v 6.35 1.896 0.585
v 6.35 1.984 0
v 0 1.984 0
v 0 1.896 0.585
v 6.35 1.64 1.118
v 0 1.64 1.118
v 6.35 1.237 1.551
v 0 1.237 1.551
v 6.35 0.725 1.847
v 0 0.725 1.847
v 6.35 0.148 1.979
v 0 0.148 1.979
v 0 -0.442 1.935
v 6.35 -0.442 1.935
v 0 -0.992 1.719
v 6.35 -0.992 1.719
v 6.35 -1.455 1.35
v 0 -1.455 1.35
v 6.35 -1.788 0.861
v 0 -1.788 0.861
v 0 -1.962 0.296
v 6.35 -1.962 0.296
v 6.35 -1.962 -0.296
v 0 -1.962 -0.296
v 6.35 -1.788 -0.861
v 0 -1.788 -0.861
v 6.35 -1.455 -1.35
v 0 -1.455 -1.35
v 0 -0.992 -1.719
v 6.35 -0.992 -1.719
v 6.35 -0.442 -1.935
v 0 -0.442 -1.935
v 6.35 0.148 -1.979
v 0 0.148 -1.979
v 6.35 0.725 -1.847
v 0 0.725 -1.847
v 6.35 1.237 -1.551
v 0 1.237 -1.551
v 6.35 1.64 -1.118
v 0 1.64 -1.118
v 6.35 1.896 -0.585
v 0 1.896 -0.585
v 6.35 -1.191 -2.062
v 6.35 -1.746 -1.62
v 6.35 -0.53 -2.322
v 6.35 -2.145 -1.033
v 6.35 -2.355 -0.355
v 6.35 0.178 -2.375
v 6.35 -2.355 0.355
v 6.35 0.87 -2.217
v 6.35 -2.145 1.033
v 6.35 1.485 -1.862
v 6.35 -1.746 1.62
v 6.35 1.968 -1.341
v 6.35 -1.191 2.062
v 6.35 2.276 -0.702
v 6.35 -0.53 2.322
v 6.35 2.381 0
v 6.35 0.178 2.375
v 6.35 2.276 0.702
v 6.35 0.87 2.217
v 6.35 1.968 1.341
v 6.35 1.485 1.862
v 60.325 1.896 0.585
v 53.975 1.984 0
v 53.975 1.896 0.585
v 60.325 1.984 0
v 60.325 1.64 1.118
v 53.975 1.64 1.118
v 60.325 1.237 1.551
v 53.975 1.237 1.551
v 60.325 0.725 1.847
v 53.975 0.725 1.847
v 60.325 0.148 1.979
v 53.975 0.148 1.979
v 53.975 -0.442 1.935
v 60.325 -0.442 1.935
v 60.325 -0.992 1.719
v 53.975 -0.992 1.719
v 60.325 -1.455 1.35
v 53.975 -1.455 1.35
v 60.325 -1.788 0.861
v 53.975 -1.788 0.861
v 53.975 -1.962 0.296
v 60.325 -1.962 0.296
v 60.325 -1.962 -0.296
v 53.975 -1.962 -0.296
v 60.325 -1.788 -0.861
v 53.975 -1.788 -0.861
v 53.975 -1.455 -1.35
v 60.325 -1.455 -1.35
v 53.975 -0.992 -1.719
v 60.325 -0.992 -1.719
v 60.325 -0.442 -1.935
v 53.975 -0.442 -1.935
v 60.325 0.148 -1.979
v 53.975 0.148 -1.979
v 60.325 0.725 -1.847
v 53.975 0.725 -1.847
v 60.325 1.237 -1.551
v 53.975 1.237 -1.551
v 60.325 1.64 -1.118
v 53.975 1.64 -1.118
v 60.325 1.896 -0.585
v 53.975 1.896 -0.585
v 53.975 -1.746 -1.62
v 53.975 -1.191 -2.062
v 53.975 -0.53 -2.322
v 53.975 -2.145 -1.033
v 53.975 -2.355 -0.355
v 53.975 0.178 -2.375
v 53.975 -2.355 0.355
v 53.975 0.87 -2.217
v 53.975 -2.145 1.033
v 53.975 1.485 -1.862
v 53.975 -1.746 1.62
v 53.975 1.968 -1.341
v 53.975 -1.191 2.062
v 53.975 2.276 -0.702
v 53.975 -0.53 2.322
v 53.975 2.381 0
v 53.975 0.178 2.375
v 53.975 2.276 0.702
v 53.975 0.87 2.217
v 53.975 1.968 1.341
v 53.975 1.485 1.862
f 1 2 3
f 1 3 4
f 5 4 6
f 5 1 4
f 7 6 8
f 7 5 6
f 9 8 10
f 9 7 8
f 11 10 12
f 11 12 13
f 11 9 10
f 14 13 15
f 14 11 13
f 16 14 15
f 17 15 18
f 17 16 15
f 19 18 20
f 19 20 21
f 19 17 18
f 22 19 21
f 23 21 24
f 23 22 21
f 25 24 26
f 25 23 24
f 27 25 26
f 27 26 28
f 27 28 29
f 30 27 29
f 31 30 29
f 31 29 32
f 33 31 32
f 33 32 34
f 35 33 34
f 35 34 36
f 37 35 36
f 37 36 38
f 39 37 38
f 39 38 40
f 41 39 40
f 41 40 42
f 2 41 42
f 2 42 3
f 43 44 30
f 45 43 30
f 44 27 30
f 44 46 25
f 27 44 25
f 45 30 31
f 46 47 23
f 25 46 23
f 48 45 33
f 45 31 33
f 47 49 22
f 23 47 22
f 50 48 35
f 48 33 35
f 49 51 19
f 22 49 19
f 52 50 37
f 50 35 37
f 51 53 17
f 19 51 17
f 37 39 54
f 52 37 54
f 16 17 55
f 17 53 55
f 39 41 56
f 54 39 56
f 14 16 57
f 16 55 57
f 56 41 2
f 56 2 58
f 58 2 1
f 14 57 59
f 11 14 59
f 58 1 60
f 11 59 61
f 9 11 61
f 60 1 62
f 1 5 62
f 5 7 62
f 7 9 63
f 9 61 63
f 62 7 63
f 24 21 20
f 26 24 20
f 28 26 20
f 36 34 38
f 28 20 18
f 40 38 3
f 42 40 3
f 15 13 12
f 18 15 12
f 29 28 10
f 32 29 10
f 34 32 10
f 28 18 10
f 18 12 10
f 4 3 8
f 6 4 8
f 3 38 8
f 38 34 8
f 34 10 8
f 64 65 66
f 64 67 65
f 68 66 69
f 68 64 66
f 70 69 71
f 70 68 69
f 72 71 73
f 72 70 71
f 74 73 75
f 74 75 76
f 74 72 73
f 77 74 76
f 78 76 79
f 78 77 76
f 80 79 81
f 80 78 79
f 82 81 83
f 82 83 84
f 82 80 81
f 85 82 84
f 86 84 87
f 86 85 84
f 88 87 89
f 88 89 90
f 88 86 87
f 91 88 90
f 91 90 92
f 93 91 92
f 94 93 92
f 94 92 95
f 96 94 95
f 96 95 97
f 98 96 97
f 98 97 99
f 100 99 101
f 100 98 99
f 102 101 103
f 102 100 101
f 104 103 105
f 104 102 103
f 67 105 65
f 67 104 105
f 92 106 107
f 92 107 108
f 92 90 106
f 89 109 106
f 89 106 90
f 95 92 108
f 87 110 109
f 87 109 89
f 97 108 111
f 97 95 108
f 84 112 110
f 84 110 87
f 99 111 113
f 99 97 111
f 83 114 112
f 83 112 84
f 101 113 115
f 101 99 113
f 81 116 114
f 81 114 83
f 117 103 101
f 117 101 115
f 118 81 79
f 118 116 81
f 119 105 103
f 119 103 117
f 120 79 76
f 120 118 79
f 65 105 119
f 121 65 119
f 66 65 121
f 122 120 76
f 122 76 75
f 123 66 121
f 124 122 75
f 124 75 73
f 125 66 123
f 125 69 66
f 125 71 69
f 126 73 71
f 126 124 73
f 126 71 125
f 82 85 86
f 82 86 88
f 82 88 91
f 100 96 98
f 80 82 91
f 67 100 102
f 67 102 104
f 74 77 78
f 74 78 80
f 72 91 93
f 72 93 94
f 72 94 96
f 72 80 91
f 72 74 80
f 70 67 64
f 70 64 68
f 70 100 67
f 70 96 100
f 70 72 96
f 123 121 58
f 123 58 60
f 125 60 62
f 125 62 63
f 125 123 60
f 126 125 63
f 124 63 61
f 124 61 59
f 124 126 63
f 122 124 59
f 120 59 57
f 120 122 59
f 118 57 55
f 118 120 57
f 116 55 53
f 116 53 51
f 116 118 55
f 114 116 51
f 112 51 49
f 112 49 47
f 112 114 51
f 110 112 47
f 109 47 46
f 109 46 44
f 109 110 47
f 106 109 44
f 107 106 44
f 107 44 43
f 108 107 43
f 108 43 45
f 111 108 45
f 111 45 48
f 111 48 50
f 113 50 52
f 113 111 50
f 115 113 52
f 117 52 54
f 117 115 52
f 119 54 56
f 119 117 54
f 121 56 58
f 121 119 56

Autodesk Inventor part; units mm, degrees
ref_plane "Start Plane" through (0, 0, 0) normal (1, 0, 0) x (0, 1, 0)
ref_plane "XZ Plane" through (0, 0, 0) normal (0, 1, 0) x (-1, 0, 0)
ref_plane "XY Plane" through (0, 0, 0) normal (0, 0, 1) x (1, 0, 0)
sketch "Main Sketch" plane through (0, 0, 0) normal (0, 0, 1) x (1, 0, 0)
  line L0 (0, 0) -> (60.325, 0)
  line L1 (0, 0) -> (0, 1.9844)
  line L2 (0, 1.9844) -> (6.35, 1.9844)
  line L3 (6.35, 1.9844) -> (6.35, 2.3813)
  line L4 (53.975, 2.3813) -> (53.975, 1.9844)
  line L5 (6.35, 2.3813) -> (53.975, 2.3813)
  line L6 (60.325, 1.9844) -> (60.325, 0)
  line L7 (53.975, 1.9844) -> (60.325, 1.9844)
  dimension "d3" = 3.9688
  dimension "d4" = 4.7625
  dimension "d5" = 3.9688
revolve "Revolution1" add sketch "Main Sketch" angle 360 about axis through (0, 0, 0) along (1, 0, 0)
equation "\"Length\" = 60.325"
properties part number "Shaft" material "Steel"
